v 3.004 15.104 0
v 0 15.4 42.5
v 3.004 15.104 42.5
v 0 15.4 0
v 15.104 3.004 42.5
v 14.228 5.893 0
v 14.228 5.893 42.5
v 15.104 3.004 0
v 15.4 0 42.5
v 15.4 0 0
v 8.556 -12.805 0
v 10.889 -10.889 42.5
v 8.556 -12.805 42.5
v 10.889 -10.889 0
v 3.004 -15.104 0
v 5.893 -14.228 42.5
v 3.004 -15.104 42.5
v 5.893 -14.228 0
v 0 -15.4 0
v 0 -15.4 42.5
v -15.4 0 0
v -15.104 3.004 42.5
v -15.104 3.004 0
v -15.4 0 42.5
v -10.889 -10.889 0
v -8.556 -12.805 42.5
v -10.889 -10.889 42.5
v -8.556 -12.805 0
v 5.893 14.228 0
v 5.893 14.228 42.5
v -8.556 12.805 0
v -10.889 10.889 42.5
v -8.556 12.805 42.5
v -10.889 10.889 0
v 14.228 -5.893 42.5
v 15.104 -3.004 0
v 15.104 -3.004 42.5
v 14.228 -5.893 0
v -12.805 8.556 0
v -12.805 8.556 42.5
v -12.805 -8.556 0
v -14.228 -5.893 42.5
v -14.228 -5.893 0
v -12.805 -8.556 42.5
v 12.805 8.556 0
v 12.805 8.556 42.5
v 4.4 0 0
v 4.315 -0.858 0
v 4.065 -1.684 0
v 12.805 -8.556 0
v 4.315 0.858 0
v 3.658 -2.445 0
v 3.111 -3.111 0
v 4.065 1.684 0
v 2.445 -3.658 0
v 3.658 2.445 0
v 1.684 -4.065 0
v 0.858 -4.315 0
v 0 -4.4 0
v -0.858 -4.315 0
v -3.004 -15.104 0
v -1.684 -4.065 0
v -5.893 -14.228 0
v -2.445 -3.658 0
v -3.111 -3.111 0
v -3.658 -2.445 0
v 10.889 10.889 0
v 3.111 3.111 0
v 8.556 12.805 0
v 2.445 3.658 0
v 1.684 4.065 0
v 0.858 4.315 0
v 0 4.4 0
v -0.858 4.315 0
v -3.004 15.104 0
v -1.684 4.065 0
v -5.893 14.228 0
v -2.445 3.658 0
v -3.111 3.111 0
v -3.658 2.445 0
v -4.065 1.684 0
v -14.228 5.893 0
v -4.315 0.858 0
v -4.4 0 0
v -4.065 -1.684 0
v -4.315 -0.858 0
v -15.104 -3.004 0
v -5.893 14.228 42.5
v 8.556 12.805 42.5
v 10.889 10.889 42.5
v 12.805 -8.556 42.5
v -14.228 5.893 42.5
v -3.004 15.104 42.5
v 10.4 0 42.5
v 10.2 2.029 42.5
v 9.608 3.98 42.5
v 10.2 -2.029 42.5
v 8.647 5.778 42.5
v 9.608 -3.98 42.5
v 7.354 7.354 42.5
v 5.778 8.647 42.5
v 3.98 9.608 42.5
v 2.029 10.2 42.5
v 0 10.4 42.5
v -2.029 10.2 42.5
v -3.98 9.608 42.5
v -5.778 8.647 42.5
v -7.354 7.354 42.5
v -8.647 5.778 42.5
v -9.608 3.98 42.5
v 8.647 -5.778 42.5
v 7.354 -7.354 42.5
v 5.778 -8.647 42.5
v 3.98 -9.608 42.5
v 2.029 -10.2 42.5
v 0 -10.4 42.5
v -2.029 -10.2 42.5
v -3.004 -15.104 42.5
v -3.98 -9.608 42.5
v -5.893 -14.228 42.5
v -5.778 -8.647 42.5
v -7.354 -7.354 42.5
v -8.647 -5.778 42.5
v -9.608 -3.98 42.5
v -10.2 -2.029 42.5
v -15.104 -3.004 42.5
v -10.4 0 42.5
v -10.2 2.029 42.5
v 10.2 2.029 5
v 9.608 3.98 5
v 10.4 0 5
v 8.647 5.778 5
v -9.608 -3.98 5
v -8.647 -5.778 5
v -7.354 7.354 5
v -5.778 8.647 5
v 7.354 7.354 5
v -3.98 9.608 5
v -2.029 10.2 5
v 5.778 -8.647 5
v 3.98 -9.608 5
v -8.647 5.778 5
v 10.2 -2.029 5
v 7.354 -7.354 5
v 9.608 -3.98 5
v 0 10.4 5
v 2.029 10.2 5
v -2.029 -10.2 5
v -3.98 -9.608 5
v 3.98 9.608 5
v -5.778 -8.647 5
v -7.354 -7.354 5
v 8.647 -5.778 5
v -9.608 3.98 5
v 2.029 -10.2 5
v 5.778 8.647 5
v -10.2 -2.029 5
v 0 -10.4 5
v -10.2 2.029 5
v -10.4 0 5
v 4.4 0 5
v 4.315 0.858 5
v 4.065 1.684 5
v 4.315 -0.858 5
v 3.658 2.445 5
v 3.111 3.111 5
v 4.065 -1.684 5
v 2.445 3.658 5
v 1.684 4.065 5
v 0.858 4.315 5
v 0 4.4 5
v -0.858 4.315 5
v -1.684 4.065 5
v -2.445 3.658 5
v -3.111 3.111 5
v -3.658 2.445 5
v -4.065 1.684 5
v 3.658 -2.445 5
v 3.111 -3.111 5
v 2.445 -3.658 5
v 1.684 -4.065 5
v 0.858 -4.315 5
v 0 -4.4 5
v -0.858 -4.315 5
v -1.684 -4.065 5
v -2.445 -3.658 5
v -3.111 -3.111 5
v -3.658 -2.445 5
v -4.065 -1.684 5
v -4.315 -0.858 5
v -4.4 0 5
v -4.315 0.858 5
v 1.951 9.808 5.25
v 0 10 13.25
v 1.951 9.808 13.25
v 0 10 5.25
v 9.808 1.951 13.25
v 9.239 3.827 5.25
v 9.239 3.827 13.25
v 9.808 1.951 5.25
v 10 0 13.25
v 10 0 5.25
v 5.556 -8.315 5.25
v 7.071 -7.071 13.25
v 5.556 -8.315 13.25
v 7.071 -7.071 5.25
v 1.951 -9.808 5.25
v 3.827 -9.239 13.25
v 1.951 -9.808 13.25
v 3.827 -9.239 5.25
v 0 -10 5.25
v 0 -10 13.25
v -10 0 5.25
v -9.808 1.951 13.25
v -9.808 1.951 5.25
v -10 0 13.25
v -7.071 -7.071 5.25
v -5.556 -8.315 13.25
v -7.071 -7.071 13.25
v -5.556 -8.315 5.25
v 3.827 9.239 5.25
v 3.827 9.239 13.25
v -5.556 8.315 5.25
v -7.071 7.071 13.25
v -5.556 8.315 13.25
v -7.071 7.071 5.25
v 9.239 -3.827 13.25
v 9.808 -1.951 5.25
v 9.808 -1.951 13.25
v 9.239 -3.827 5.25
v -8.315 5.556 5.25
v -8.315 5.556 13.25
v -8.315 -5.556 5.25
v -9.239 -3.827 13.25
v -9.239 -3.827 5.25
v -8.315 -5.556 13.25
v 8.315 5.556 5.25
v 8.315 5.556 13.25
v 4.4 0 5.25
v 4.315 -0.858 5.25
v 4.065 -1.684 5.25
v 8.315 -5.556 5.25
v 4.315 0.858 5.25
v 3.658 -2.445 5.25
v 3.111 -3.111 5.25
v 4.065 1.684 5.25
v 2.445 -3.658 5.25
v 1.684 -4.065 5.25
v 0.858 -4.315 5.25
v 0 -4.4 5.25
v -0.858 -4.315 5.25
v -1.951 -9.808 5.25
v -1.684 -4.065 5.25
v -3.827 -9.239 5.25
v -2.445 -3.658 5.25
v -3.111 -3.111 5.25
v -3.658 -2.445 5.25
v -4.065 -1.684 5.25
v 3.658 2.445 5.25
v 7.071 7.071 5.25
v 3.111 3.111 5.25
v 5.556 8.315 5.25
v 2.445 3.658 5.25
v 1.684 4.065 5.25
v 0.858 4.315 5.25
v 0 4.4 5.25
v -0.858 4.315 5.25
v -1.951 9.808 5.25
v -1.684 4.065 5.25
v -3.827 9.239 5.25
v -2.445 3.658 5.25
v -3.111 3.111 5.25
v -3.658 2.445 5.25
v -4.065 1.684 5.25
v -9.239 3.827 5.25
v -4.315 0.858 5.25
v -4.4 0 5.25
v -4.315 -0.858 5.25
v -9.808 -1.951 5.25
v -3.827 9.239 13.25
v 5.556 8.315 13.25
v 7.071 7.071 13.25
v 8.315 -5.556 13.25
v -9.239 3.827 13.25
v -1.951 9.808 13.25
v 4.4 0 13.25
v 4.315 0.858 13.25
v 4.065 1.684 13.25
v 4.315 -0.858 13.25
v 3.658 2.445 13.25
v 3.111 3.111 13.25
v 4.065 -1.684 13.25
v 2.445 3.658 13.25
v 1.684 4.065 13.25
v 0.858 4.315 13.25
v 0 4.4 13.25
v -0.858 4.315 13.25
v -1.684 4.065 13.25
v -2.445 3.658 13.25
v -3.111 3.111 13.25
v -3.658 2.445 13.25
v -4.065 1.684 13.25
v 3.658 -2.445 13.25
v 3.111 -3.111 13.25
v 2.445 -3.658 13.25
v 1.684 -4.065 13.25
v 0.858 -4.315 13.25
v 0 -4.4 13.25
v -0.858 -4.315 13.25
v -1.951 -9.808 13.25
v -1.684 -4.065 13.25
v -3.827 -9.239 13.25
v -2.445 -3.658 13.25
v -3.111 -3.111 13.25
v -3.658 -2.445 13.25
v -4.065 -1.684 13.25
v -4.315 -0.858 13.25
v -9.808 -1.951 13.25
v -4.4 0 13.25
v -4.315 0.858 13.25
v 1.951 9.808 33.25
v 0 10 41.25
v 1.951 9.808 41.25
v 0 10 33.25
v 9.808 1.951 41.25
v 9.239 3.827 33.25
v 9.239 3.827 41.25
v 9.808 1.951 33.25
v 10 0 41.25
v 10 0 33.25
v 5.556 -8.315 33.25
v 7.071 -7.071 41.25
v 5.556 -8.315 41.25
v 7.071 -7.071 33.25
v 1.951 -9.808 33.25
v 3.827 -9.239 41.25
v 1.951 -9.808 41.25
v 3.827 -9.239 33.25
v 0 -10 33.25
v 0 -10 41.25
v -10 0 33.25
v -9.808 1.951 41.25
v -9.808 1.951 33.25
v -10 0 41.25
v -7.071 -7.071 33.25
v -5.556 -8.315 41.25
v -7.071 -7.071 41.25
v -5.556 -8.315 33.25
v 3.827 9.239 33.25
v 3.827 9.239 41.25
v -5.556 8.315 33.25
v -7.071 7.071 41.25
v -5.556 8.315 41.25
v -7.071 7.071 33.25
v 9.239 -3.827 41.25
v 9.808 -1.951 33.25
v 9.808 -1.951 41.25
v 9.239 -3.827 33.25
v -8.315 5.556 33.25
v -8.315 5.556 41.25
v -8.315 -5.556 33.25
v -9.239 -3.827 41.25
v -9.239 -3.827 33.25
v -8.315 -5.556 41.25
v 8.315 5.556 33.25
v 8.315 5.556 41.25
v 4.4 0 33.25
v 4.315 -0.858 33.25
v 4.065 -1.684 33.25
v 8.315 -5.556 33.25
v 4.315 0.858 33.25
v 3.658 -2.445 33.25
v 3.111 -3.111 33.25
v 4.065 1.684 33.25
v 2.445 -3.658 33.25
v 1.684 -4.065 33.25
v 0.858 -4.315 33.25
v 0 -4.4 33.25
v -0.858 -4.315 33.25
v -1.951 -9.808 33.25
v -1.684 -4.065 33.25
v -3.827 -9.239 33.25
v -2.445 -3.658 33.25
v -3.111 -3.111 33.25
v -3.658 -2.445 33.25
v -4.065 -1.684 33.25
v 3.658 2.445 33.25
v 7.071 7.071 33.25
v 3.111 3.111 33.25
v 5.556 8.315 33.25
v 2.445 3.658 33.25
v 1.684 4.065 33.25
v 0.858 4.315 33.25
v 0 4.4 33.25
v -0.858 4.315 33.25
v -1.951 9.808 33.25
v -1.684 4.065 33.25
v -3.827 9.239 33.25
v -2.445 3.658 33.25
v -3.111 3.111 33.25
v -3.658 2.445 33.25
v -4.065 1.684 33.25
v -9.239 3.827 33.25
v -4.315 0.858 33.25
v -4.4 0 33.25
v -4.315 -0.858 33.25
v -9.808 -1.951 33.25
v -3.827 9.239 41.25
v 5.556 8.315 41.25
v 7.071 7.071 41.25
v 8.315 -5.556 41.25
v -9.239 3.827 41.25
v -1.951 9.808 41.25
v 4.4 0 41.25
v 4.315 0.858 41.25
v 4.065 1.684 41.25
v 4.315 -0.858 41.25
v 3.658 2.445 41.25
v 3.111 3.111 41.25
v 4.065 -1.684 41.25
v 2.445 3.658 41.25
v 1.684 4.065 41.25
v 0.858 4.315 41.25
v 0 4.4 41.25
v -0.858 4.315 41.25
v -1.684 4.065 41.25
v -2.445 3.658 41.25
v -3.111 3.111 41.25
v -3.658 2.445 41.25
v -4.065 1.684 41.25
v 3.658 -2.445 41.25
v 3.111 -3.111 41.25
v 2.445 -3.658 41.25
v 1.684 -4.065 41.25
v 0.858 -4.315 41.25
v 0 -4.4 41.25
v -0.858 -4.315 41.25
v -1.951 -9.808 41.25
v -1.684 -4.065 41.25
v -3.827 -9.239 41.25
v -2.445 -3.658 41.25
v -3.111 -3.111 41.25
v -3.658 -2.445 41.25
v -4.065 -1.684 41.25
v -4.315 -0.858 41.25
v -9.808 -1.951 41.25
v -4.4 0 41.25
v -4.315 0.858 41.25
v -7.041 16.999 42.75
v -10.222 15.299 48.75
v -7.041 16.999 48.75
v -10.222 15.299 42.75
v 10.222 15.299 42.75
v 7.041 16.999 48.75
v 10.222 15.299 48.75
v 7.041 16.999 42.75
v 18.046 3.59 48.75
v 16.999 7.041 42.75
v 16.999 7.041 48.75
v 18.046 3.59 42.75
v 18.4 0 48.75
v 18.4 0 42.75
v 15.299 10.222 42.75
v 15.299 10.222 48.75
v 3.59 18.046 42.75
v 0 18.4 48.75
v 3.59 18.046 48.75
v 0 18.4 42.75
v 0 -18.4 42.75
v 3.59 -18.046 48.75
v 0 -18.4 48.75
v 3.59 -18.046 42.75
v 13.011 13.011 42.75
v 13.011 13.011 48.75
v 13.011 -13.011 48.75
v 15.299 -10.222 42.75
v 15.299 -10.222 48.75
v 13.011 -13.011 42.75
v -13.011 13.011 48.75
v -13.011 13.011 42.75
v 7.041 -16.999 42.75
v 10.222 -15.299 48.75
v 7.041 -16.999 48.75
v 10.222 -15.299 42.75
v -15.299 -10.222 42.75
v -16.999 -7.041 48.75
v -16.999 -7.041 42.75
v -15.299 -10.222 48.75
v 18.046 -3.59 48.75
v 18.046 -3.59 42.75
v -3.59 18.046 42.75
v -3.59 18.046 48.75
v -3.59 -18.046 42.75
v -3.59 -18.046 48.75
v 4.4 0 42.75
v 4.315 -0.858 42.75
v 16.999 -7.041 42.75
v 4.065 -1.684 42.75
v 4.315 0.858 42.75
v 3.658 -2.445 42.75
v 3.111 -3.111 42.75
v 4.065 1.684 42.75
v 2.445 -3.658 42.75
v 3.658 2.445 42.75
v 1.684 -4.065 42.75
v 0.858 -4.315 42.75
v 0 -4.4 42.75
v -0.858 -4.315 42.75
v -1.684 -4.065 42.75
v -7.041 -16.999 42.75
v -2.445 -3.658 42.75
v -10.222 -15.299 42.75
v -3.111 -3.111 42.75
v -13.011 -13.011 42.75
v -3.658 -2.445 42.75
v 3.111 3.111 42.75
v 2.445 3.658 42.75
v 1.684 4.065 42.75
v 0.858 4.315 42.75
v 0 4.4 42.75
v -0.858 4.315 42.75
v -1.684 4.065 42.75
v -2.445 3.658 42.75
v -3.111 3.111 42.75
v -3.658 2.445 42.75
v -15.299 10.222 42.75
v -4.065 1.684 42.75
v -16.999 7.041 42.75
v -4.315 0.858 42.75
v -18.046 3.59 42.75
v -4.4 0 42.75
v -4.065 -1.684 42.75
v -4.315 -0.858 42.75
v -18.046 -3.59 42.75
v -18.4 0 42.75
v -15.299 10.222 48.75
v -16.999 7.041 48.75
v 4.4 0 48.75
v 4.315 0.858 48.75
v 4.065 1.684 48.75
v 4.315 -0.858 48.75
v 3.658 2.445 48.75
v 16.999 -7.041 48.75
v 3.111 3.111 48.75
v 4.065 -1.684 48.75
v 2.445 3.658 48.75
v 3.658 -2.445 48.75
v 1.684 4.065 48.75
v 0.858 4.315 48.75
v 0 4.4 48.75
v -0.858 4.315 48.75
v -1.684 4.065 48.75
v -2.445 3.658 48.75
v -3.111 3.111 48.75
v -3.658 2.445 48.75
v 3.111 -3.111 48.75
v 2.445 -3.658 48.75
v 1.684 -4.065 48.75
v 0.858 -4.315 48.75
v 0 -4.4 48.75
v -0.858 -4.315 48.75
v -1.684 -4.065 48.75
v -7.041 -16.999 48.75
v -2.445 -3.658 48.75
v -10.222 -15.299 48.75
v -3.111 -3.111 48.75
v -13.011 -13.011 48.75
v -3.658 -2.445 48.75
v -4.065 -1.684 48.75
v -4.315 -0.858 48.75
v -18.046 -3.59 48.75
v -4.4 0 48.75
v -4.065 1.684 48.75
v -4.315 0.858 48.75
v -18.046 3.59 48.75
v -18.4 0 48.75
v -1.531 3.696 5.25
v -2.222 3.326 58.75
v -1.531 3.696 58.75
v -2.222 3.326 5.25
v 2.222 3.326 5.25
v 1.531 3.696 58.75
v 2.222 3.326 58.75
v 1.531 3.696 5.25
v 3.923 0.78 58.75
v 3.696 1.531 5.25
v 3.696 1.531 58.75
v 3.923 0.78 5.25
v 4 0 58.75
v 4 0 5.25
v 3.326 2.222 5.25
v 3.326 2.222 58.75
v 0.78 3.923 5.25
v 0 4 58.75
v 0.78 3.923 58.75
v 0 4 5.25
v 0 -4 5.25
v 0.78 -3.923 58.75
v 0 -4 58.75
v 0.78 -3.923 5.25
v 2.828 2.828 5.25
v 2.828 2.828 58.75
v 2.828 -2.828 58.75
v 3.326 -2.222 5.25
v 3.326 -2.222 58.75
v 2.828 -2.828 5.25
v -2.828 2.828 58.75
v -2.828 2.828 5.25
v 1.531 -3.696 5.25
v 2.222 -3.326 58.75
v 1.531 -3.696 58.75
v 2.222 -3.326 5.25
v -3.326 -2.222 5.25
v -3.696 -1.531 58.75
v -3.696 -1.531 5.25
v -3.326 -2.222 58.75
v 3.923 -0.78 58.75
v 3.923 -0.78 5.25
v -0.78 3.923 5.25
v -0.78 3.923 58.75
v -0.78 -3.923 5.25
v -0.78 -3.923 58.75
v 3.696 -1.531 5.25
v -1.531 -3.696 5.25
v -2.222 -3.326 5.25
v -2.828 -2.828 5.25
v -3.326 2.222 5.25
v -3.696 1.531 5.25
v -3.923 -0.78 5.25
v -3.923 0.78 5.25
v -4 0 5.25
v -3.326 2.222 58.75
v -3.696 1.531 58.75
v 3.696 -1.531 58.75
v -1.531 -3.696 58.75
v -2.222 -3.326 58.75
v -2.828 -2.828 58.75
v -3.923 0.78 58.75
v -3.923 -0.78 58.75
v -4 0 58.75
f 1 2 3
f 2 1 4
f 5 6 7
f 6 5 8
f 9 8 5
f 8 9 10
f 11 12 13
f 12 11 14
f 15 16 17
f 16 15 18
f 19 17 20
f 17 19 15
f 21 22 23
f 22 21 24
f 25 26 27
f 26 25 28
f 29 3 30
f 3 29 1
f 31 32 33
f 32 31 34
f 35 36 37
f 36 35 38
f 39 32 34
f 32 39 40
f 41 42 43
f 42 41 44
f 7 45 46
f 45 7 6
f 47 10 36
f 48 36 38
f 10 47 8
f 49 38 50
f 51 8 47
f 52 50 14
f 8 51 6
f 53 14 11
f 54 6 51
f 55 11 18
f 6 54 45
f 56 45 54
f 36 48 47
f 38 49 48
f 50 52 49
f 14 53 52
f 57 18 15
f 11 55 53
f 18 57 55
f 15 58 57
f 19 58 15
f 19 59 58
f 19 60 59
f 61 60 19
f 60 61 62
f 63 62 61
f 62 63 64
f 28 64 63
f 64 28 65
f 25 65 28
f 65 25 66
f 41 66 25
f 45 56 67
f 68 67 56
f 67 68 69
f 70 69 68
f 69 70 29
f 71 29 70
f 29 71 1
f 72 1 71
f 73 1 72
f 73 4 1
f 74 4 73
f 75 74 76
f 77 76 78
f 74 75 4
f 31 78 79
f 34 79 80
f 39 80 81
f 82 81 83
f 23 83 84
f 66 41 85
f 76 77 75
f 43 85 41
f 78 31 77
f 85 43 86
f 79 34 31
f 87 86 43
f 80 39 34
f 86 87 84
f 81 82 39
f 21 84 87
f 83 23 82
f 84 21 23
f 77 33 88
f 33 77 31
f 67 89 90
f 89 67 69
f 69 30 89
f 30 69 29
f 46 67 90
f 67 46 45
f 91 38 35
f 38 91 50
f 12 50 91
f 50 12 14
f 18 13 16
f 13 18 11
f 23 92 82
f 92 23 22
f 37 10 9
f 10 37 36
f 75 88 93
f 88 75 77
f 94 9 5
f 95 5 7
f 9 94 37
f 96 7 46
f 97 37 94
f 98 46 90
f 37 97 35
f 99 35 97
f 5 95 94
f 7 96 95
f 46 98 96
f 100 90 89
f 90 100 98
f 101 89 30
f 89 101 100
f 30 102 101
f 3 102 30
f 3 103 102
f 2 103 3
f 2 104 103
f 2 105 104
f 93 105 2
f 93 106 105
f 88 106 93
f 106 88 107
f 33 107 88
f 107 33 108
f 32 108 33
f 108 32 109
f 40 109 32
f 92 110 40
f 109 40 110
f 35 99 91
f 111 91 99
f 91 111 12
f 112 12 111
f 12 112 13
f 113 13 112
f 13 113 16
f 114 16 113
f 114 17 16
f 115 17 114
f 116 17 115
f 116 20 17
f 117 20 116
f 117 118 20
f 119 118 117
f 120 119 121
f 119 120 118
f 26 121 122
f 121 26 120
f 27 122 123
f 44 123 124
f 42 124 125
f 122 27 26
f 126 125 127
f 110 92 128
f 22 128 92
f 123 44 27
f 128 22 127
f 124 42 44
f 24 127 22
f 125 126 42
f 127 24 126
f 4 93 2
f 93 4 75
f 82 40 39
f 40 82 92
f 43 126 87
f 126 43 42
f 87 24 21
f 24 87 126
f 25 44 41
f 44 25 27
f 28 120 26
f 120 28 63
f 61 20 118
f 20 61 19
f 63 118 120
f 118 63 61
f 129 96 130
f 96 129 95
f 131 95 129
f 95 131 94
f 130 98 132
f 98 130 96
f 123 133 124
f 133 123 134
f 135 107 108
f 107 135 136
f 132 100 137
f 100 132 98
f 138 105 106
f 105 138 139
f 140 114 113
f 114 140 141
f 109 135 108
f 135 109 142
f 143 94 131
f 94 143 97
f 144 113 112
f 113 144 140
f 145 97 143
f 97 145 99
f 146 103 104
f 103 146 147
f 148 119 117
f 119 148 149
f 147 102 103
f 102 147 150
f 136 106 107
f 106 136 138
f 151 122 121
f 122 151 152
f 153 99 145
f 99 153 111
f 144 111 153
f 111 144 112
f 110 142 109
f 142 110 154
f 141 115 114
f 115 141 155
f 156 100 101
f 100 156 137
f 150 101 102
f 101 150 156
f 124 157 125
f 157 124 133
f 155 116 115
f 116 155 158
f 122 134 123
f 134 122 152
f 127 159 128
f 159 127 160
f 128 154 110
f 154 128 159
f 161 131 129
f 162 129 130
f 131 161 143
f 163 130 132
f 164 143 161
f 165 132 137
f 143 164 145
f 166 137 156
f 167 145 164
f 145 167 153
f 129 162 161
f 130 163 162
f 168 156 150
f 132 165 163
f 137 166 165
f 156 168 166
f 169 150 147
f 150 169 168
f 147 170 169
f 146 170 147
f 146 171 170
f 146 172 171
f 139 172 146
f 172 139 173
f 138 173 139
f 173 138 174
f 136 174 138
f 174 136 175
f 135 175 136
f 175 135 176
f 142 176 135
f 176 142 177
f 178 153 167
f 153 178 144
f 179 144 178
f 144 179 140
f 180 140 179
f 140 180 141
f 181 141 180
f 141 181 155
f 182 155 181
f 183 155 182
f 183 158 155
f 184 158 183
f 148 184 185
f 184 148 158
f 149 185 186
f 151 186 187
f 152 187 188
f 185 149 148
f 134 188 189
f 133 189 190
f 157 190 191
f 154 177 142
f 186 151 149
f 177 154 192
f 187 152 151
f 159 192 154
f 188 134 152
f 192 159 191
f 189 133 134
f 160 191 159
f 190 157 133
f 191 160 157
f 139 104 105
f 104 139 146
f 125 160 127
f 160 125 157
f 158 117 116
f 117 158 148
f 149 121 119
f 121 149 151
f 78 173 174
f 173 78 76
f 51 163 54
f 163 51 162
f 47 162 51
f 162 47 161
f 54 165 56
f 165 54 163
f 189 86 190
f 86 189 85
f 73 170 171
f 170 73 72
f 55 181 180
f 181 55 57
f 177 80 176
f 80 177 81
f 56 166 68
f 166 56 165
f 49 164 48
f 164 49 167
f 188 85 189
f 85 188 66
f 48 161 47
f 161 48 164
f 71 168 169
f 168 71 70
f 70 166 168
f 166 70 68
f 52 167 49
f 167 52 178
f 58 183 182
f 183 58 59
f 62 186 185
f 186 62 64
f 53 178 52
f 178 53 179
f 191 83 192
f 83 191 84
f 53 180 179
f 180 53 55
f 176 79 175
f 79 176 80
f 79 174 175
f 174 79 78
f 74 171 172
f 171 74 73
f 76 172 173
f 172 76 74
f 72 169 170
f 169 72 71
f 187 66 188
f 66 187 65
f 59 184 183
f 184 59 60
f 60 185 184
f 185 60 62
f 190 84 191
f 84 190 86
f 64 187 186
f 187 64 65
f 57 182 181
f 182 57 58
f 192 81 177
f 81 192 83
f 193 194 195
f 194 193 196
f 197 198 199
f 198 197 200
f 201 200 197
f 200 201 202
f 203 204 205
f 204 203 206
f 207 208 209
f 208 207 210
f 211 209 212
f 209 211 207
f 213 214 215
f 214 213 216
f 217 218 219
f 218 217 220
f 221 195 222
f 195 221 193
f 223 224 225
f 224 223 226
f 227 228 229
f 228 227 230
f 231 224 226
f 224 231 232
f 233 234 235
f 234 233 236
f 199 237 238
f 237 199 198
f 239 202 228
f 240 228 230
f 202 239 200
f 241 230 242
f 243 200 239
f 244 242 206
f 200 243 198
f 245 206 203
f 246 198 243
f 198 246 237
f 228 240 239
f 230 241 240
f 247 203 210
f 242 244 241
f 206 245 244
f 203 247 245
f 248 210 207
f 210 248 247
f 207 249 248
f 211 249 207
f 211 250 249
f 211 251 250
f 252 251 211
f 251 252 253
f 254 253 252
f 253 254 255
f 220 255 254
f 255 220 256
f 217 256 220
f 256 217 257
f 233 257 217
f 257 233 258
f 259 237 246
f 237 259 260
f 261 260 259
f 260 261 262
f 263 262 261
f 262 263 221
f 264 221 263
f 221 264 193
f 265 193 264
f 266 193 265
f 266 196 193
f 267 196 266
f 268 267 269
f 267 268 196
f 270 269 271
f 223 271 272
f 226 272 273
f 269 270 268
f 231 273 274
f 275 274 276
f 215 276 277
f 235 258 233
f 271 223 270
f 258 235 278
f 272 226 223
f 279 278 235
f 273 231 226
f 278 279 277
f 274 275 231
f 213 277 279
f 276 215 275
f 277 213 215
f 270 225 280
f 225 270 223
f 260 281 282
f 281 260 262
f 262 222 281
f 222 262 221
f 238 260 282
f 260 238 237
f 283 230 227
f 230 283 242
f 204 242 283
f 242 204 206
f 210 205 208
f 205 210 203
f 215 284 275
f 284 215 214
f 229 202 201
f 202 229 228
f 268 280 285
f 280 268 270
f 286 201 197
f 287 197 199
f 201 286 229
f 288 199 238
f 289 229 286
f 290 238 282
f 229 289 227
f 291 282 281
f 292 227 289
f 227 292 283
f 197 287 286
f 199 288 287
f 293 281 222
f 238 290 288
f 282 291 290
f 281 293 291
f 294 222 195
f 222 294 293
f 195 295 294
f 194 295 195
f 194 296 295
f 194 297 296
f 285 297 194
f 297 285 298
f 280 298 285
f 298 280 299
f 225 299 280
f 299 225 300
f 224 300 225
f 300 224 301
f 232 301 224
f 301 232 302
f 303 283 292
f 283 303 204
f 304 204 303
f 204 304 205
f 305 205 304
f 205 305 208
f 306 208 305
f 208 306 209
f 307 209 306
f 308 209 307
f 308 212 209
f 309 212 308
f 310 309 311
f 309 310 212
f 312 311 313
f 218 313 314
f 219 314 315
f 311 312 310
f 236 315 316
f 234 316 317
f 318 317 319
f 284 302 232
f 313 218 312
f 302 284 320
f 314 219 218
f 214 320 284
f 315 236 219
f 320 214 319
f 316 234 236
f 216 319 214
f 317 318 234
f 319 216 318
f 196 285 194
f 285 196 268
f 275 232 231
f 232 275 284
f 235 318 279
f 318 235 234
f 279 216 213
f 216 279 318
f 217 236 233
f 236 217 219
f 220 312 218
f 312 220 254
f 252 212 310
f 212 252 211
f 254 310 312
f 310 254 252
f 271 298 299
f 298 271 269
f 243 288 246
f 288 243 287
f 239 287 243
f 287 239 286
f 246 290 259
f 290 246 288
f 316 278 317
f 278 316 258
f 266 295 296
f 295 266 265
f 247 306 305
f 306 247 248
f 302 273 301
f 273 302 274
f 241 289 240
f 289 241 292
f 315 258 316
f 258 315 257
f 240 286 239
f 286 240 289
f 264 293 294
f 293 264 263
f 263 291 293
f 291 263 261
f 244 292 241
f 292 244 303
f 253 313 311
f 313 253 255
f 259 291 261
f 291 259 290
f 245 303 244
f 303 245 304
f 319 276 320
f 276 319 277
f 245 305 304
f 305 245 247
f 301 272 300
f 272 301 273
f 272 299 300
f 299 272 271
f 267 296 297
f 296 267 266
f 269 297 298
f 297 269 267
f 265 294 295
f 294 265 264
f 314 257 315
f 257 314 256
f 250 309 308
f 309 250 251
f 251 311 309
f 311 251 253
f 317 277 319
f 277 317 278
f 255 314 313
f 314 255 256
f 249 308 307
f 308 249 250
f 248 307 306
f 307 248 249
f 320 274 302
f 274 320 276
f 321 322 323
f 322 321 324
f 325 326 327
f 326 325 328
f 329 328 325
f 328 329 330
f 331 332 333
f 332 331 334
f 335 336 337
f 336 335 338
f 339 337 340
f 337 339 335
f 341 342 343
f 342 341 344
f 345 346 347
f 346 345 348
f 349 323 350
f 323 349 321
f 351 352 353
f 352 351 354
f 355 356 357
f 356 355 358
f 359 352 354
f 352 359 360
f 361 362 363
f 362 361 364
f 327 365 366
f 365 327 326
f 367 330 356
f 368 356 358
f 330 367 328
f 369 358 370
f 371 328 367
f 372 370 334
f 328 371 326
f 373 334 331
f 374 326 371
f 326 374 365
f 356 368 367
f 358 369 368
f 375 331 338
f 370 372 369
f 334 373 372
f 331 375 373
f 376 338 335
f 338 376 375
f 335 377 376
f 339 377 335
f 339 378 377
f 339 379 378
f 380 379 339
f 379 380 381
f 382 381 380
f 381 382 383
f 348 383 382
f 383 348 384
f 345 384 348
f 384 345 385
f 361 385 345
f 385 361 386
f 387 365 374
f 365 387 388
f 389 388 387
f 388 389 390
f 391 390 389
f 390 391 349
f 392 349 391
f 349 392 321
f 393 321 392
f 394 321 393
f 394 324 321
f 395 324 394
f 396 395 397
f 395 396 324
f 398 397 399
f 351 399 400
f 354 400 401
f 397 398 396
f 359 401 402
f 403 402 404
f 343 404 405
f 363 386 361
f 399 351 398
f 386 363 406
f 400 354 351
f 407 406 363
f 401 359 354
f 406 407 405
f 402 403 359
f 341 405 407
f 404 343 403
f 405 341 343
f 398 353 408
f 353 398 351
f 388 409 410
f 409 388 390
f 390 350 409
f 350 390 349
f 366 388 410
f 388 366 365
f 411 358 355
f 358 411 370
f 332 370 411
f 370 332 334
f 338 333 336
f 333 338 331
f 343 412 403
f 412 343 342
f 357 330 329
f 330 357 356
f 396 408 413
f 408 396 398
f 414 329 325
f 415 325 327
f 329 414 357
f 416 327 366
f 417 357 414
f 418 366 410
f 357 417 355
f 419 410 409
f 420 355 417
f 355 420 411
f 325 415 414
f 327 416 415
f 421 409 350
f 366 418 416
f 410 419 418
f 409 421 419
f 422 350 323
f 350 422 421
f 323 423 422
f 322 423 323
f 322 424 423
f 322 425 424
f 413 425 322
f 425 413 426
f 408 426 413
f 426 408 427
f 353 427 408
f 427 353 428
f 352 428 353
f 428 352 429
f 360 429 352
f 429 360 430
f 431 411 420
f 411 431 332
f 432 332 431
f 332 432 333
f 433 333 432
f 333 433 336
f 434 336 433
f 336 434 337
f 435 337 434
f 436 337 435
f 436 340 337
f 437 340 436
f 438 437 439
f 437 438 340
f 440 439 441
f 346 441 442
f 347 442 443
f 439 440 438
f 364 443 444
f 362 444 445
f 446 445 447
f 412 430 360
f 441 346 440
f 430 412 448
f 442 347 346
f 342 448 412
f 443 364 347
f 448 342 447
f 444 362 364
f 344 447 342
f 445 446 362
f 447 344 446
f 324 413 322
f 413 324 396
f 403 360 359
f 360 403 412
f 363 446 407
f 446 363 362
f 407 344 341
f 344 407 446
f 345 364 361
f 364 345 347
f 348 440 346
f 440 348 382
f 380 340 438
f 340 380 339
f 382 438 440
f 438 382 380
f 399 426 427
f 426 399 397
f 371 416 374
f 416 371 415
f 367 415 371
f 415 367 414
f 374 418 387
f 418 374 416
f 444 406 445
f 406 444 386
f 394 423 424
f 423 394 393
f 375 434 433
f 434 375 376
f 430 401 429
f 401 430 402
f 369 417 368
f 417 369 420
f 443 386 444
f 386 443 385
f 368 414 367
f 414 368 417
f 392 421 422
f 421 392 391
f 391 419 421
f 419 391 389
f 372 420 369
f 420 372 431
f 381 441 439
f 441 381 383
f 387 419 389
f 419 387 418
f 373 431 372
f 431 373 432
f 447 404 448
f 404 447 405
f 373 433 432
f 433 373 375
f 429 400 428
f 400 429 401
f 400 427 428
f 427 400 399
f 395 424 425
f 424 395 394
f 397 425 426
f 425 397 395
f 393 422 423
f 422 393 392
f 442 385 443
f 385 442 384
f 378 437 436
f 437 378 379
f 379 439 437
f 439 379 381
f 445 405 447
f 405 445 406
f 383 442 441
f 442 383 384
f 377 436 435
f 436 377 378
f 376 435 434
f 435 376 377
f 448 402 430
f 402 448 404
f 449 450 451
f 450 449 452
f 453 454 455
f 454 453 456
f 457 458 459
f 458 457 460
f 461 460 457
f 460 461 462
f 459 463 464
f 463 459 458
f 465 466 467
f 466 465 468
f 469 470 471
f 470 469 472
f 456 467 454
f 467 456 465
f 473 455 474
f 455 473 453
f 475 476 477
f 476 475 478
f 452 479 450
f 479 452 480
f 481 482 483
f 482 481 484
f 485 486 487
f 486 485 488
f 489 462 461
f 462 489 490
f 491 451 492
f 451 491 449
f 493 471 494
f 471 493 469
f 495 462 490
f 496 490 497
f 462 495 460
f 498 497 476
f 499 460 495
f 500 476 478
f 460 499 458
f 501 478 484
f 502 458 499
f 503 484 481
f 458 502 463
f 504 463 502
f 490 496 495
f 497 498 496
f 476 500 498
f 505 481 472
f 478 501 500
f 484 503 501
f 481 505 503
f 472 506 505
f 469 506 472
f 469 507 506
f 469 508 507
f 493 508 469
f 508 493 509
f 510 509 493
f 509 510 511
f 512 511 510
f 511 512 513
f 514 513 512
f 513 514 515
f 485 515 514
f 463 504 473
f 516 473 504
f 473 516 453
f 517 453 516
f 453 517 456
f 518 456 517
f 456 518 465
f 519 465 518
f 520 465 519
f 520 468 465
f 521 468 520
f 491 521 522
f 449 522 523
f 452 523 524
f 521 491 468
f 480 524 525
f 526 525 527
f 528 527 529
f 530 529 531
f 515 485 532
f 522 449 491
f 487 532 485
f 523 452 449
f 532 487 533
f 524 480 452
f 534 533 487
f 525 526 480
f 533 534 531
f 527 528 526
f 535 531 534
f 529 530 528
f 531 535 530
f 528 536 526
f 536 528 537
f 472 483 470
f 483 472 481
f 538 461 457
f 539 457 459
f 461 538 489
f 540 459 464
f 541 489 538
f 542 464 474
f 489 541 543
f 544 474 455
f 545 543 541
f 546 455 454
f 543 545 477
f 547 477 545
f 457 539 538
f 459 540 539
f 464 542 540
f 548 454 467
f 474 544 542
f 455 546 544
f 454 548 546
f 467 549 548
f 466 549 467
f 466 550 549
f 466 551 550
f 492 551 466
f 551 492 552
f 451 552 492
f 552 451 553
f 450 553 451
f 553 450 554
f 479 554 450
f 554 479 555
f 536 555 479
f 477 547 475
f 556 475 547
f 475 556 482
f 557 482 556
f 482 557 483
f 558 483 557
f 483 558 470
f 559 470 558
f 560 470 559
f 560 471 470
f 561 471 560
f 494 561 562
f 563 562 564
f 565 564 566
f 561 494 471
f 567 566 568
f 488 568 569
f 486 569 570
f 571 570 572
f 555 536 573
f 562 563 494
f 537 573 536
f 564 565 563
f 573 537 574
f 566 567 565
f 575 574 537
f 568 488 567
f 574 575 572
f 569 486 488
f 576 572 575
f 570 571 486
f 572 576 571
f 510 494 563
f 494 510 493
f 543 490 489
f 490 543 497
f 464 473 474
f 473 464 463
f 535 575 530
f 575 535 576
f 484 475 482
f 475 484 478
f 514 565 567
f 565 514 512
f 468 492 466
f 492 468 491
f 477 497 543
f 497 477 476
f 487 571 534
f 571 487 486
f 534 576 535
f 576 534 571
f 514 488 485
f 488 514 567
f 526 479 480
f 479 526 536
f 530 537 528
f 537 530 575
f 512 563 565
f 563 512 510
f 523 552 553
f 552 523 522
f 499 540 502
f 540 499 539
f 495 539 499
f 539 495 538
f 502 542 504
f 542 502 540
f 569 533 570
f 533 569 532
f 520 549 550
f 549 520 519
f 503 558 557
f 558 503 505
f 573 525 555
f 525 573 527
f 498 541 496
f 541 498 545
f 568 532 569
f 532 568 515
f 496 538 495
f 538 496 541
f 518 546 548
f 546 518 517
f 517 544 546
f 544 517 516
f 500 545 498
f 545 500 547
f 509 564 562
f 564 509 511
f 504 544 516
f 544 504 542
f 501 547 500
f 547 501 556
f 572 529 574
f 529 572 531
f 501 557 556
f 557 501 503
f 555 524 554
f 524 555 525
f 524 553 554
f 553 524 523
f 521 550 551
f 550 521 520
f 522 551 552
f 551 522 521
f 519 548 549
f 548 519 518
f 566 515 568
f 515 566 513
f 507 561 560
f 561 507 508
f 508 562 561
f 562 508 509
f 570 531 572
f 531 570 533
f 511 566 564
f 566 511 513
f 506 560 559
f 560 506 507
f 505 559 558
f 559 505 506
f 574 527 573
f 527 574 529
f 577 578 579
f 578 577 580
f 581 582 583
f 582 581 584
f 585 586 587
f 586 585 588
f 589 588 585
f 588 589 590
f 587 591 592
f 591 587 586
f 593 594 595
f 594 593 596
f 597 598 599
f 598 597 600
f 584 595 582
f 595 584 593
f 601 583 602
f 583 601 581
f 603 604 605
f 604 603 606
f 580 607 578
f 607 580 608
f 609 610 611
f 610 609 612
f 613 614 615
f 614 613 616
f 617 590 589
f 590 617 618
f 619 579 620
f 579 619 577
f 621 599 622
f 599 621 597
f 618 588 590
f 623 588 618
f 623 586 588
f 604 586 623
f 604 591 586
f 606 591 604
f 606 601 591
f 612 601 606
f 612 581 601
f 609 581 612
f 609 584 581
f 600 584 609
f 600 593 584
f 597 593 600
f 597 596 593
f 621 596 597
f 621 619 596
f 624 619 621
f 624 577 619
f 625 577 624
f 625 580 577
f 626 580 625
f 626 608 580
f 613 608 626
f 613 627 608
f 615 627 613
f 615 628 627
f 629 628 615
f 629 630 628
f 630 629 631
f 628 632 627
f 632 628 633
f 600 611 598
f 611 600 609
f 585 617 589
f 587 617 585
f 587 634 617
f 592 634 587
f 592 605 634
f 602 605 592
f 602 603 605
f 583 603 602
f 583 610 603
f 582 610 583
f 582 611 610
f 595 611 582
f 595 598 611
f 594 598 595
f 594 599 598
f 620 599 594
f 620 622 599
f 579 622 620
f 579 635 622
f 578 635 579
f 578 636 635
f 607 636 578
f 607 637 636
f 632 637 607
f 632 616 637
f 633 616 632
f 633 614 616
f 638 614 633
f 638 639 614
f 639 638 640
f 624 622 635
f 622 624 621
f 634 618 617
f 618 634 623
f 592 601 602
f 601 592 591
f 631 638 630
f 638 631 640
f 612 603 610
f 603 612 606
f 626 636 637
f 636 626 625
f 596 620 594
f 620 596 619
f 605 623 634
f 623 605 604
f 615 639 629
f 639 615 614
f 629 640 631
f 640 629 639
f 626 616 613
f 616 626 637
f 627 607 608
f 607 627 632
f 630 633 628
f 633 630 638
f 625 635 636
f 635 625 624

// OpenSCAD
$fn = 32;

// ------------------------------------------------------------------------
// Shaft station: cup d30.8 x 42.5 mm, shaft d8
// Every part is its own module, assembly() places every instance.
// ------------------------------------------------------------------------

// --- part 1 ---
module housing_cup() {
  difference() {
    cylinder(h = 42.5, d = 30.8);
    translate([0, 0, 5]) cylinder(h = 38.5, d = 20.8);
    translate([0, 0, -1]) cylinder(h = 7, d = 8.8);
  }
}

// --- part 2 ---
module bearing_lower() {
  difference() {
      translate([0, 0, 0]) cylinder(h = 8, d = 20);
      translate([0, 0, -1]) cylinder(h = 10, d = 8.8);
    }
}

// --- part 3 ---
module bearing_upper() {
  difference() {
      translate([0, 0, 0]) cylinder(h = 8, d = 20);
      translate([0, 0, -1]) cylinder(h = 10, d = 8.8);
    }
}

// --- part 4 ---
module station_shaft() {
  translate([0, 0, -26.75]) cylinder(h = 53.5, d = 8);
}

// --- part 5 ---
module station_cover() {
  difference() {
    cylinder(h = 6, d = 36.8);
    translate([0, 0, -1]) cylinder(h = 8, d = 8.8);
  }
}

// --- assembly ---
module assembly() {
  color([0.80, 0.24, 0.20]) translate([0, 0, 0]) rotate([0, 0, 0]) housing_cup();
  color([0.20, 0.45, 0.75]) translate([0, 0, 5.25]) rotate([0, 0, 0]) bearing_lower();
  color([0.25, 0.62, 0.32]) translate([0, 0, 33.25]) rotate([0, 0, 0]) bearing_upper();
  color([0.92, 0.70, 0.18]) translate([0, 0, 32]) rotate([0, 0, 0]) station_shaft();
  color([0.58, 0.35, 0.70]) translate([0, 0, 42.75]) rotate([0, 0, 0]) station_cover();
}

assembly();
